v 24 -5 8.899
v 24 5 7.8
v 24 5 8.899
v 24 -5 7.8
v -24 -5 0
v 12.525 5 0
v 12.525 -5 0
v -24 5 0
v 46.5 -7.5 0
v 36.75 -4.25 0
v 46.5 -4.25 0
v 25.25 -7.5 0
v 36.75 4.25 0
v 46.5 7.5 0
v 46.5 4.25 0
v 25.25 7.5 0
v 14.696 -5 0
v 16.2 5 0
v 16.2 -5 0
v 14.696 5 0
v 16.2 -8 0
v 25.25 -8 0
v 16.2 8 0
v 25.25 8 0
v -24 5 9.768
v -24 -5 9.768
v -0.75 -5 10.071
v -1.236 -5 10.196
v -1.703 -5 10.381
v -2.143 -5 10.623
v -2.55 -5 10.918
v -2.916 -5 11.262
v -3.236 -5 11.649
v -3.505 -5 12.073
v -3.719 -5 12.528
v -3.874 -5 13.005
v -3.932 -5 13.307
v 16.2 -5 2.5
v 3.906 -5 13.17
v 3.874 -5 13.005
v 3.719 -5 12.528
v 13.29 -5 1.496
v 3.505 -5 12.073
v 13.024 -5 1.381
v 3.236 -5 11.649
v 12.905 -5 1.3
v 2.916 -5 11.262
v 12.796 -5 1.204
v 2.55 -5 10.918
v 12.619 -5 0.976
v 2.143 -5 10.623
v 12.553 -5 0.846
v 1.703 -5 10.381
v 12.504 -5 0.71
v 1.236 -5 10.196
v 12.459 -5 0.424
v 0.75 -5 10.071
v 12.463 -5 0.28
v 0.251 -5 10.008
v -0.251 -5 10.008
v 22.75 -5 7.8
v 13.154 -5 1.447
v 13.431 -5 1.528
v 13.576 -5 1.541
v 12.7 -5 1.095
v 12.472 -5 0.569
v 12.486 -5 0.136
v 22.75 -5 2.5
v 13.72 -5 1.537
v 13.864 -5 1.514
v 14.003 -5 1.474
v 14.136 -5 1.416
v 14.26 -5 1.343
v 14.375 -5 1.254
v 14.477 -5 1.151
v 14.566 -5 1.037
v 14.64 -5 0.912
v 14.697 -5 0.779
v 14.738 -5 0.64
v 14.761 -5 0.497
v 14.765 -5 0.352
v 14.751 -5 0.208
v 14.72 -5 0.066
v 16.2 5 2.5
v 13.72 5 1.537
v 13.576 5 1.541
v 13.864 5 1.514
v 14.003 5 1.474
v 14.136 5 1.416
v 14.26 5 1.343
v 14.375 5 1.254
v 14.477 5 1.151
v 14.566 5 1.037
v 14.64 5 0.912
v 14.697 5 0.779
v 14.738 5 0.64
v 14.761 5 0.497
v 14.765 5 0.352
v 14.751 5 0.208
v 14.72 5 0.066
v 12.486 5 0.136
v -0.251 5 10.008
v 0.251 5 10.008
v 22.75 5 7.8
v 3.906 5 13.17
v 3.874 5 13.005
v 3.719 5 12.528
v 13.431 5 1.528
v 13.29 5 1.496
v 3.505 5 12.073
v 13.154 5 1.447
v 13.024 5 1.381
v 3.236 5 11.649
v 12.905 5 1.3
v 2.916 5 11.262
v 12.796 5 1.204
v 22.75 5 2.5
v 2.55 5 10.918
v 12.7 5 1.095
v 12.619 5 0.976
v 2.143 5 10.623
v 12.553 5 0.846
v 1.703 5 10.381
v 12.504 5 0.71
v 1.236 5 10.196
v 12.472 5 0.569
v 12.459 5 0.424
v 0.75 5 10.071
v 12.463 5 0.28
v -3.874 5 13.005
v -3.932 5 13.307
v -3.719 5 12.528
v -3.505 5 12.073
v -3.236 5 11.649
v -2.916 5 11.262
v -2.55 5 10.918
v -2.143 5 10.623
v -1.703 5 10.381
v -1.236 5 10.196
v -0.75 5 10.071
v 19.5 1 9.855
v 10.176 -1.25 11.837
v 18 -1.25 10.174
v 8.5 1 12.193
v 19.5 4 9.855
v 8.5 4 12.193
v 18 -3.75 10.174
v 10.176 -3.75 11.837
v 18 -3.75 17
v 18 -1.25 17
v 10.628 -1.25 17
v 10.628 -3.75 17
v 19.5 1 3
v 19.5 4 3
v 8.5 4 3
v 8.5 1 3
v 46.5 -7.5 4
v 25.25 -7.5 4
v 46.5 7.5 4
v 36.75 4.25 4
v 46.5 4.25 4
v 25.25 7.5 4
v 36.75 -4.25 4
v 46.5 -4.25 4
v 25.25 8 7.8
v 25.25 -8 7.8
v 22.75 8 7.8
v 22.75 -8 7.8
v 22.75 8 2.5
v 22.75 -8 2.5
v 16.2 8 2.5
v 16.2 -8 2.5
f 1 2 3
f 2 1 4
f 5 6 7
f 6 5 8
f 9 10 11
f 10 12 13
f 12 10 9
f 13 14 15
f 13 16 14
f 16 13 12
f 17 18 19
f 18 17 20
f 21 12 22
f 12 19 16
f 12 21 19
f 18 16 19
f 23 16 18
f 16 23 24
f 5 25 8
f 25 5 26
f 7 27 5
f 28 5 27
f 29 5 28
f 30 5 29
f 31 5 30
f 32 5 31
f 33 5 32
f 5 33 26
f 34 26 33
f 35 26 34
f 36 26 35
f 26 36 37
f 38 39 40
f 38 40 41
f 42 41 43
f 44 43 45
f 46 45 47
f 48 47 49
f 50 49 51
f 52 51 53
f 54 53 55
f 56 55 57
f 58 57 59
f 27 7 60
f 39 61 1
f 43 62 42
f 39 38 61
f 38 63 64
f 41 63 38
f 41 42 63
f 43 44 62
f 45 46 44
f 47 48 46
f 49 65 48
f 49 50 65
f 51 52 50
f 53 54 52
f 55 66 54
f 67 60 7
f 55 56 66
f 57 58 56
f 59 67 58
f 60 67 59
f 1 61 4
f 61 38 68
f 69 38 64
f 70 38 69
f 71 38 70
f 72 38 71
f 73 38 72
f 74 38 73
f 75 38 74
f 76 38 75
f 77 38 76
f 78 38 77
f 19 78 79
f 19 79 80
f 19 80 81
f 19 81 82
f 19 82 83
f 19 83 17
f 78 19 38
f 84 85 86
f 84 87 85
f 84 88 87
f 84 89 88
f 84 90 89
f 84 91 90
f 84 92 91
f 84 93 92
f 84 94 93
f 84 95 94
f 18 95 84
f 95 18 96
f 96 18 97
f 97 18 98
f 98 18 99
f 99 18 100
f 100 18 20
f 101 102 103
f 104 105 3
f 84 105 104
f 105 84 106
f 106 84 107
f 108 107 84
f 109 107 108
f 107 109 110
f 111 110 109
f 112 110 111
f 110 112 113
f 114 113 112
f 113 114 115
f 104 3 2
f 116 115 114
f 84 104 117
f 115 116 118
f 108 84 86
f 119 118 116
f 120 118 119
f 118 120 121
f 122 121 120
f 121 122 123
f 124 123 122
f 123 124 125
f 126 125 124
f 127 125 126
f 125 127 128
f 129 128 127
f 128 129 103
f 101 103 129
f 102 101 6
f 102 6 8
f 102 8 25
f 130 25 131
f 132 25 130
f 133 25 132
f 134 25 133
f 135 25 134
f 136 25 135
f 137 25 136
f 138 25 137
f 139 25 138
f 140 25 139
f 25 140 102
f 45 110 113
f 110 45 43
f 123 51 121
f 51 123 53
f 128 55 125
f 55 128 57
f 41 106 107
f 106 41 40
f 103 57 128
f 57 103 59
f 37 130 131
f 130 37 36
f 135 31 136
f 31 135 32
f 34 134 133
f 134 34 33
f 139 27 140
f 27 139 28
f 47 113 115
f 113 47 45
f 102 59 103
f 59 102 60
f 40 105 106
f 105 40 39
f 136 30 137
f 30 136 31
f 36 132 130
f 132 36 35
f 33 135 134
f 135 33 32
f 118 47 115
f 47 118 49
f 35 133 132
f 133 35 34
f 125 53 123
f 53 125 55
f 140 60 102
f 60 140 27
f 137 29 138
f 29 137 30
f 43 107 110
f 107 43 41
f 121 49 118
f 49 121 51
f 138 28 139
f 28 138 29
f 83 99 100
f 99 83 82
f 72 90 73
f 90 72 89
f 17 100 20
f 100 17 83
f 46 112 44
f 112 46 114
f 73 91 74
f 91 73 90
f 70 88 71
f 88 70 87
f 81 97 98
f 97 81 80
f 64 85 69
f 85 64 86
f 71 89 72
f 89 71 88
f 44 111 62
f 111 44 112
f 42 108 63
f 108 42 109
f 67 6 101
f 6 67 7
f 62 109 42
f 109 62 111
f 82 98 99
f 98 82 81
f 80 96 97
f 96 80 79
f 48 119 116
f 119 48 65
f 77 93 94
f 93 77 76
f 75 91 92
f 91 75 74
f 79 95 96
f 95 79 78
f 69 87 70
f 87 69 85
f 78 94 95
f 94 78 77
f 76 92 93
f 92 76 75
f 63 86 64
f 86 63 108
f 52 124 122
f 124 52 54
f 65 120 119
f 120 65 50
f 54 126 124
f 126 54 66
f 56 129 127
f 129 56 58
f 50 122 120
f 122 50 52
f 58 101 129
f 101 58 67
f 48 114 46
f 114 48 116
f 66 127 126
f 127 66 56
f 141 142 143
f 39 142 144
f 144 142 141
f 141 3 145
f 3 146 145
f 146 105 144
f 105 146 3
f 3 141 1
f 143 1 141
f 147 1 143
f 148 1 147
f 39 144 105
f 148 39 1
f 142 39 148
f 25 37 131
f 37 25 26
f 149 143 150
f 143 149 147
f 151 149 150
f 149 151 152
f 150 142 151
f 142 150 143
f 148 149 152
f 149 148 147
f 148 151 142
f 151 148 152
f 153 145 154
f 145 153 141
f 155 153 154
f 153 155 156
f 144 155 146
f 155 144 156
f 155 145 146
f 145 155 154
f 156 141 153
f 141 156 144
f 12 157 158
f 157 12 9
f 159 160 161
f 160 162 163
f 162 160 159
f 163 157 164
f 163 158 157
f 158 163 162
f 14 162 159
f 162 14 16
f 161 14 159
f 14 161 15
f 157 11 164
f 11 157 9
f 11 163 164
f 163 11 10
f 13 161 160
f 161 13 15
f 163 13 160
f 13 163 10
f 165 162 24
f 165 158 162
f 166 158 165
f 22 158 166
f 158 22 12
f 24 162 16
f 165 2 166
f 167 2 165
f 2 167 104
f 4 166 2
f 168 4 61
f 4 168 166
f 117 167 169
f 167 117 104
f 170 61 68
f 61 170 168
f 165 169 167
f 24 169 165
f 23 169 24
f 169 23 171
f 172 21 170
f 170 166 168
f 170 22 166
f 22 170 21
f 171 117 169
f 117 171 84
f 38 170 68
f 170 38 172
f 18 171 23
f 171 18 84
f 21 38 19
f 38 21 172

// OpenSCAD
$fn=8;

ts=2.5; // толщина стенки
tp=1;//диаметр жилы
tpr=1.7;//диаметр провода
trb=[2,tp,3];//внешний, внутренний высота
knt=[20,11, 7.5, 7.8];//высота до центра, толщина, высота стопора
dkn=2.5;//длина контактной площадки
shp=3.0;//высота шипа
do=3.8;
guard=[15,8.5,11];
step=guard.x;//шаг контактов
lin=[step,knt.x+trb.x,4];//ширина, длина, толщина
kk=1;//количество контактов
hhr=4.5+0.5;//высота верхней части раъема
//прищепка
prk=[8,10,1.5,24,10];//диаметр опоры, ширина,диаметр проволоки, длина плеча,высота половины


alll();
//alll_0();
module alll(){
    difference(){
        union(){
            prih();
            translate([0, -step*(kk-1)/2, 0]) {
                for(a=[0:1:kk-1]){
                    translate([0,a*step,0]){
                        translate([lin.y+prk[3],0,0])rotate([0,0,-90])pin_lin();
                        translate([prk[3],0,knt[3]/2])cube([ts,step+1,knt[3]],true);
                        translate([prk[3]-knt[3]/2,0,ts/2])cube([knt[3],step+1,ts],true);
                    }
                }
            }
        }
        //for(a=[0:1:kk-1]){
           // translate([0,a*step,0]){
               // translate([prk[3]-ts,-step*(kk-1)/2,ts])cube([tp,tp,ts*13],true);
               // translate([prk[3]-ts-knt[3]/2,-step*(kk-1)/2,ts-tpr/2+0.1])cube([knt[3],tpr,tpr],true);
           // }
        //}
      //  translate([prk[3]-ts,0,knt[3]+ts*3/2])cube([ts,prk.y*2,ts*3],true);
      //  translate([-prk[3]*2+prk[3]-ts/2,0,0]){
            //translate([0,step+0.1,tpr/2+prk[4]/3])cube([prk[3]*4,tpr,tpr],true);
           // translate([0,step+0.1,tpr/2+2*prk[4]/3])cube([prk[3]*4,tpr,tpr],true);
           // translate([0,-step+0.1,tpr/2+prk[4]/3])cube([prk[3]*4,tpr,tpr],true);
          //  translate([0,-step+0.1,tpr/2+2*prk[4]/3])cube([prk[3]*4,tpr,tpr],true);
     //   }
        
    }
}
module alll_0(){
    difference(){
        union(){
            prih();
            translate([0, -step*(kk-1)/2, 0]) {
                for(a=[0:1:kk-1]){
                    translate([0,a*step,0]){
                        translate([lin.y+prk[3],0,0])rotate([0,0,-90])pin_lin_0();
                        translate([prk[3],0,knt[3]/2])cube([ts,step+1,knt[3]],true);
                        translate([prk[3]-knt[3]/2,0,ts/2])cube([knt[3],step+1,ts],true);
                    }
                }
            }
        }
        //for(a=[0:1:kk-1]){
           // translate([0,a*step,0]){
               // translate([prk[3]-ts,-step*(kk-1)/2,ts])cube([tp,tp,ts*13],true);
               // translate([prk[3]-ts-knt[3]/2,-step*(kk-1)/2,ts-tpr/2+0.1])cube([knt[3],tpr,tpr],true);
           // }
        //}
        //translate([prk[3]-ts,0,knt[3]+ts*3/2])cube([ts,prk.y*2,ts*3],true);
        //translate([-prk[3]*2+prk[3]-ts/2,0,0]){
          //  translate([0,step+0.1,tpr/2+prk[4]/3])cube([prk[3]*4,tpr,tpr],true);
          //  translate([0,step+0.1,tpr/2+2*prk[4]/3])cube([prk[3]*4,tpr,tpr],true);
          //  translate([0,-step+0.1,tpr/2+prk[4]/3])cube([prk[3]*4,tpr,tpr],true);
          //  translate([0,-step+0.1,tpr/2+2*prk[4]/3])cube([prk[3]*4,tpr,tpr],true);
       // }
        
    }
}

module prih(){
    $fn=50;
    difference(){
        union(){
            translate([0, 0, (prk[4]+prk[0]/2)])rotate([180,0,0])difference(){
                translate([0, 0, (prk[4]+prk[0]/2)/2]) cube([prk[3]*2,prk[1],prk[4]+prk[0]/2],true);
                translate([0, -prk[1]/2-0.5,0])rotate([-90,0,0])cylinder(prk[1]+1,prk[0]/2,prk[0]/2);
                rotate([0,-45,0])translate([prk[3]-prk[0]/2-prk[2]/2, -prk[1]/2-0.5,0])rotate([-90,0,0])cylinder(prk[1]+1,prk[2]/1.3,prk[2]/1.3);
                rotate([0,-12,0])translate([0, 0, -(prk[4]+prk[0]/2)/2]) cube([prk[3]*4,prk[1]*2,prk[4]+prk[0]/2],true);
                rotate([0,10,0])translate([0, 0, -(prk[4]+prk[0]/2)/2]) cube([prk[3]*4,prk[1]*2,prk[4]+prk[0]/2],true);
            }
            difference(){
                translate([prk[3]-prk[1], -2*ts/2, prk[4]]) cube([prk[1]-2,ts,prk[4]*1.4],true);
                translate([prk[3]-prk[1]-(prk[1]-2), -2*ts/2, prk[4]]) rotate([0,5,0])cube([prk[1]-2,ts*2,prk[4]*2],true);
            }
        }
        translate([(prk[3]-prk[1]), 2*ts/2, prk[4]]) cube([prk[1]+1,ts+0.5,prk[4]*1.4],true);
    }
    
}

//all_2();
module all_2(){
    difference(){
        union(){
            for(a=[0:1:kk-1]){
                translate([0,0,a*step])pin2();
            }
            for(a=[0:1:kk-1]){
                translate([knt[3]/2,0,a*step+step/2])ship();
            }
            hh=step*kk;
            translate([knt.y+ts/2, 0, hh/2]) cube([ts,knt.x*2,hh],true);
            translate([knt.y/2, -ts/2, hh/2]) cube([knt.y+ts+lin.z,ts,hh],true);
        }
        for(a=[0:1:kk-1]){
            translate([0,0,a*step])pin3();
        }
        for(a=[0:1:kk-1]){
            translate([0,0,a*step])pin4();
        }
    }
}

module ship(){
    intersection(){
        rotate([-90,0,0])cylinder(shp,do/2,do/2);
        cube([ts,do*4,8],true);
    }
}


module pin4(){
    translate([knt.x/2,-ts-0.1,step/2])cube([knt.x*2,tp,tp],true);;
}

module pin3(){
    translate([knt.y+ts,-knt.x/2-ts,step/2])cube([tpr,knt.x,tpr],true);;
}


module pin2(){
    //translate([-lin.z,knt.x,step/2])rotate([0,90,0])pin();
    translate([-lin.z,knt.x,step/2])rotate([0,90,0])pin_lin();
}

module pin1(){
    translate([0,0,lin.z])rotate([0,180,0])pin();
}

module pin(){
    difference(){
        union(){
            cylinder(trb.z+lin.z,trb.x/2,trb.x/2);
            translate([0, trb.x/2-lin.y/2,lin.z/2]) cube(lin,true);
        }
        translate([0,0,-0.1])cylinder(trb.z*2,trb.y/2,trb.y/2);
        translate([0,-(trb.x/2+trb.y),-0.1])cylinder(trb.z*2,trb.y/2,trb.y/2);
        translate([0, 0,trb.z+lin.z+trb.x/4]) rotate([-45,0,0])cube([trb.x*2,trb.x*2,trb.x/2],true);
    }
}

//pin_lin();
module pin_lin(){
    difference(){
        union(){
            //cylinder(trb.z+lin.z,trb.x/2,trb.x/2);
          //  translate([0, -trb.z/2+trb.y,(trb.z+lin.z)/2]) cube([lin.x,dkn,trb.z+lin.z],true);
           // translate([0, -trb.z/2+trb.y-dkn/2-ts/2-hhr,(trb.z+lin.z+ts)/2]) cube([lin.x,ts,trb.z+lin.z+ts],true);
            translate([0, trb.x/2-lin.y/2-0.5,lin.z/2]) cube(lin,true);
        }
        //translate([0,-0.25,-0.1])cylinder(trb.z*2,trb.y/2,trb.y/2);
       // translate([0,-0.25,trb.z-0.1])cube([trb.y,trb.y,trb.z*2],true);
       // translate([0,-trb.z+0.25,trb.z-0.1])cube([trb.y,trb.y,trb.z*2],true);
      //  translate([0, 0,trb.z+lin.z+trb.x/4]) rotate([-45,0,0])cube([trb.x*2,trb.x*3,trb.x/2],true);
        translate([0, -trb.z/2+trb.y-dkn/2-hhr-ts+guard.z,ts]) cube([guard.y,guard.z*2,ts*5],true);
    }
}
module pin_lin_0(){
    difference(){
        union(){
            //cylinder(trb.z+lin.z,trb.x/2,trb.x/2);
            //translate([0, -trb.z/2+trb.y,(trb.z+lin.z)/2]) cube([lin.x,dkn,trb.z+lin.z],true);
           // translate([0, -trb.z/2+trb.y-dkn/2-ts/2-hhr,(trb.z+lin.z+ts)/2]) cube([lin.x,ts,trb.z+lin.z+ts],true);
            translate([0, trb.x/2-lin.y/2-0.5,lin.z]) cube([lin.x, lin.y, lin.z*2],true);
        }
        //translate([0,-0.25,-0.1])cylinder(trb.z*2,trb.y/2,trb.y/2);
        //translate([0,-0.25,trb.z-0.1])cube([trb.y,trb.y,trb.z*2],true);
        //translate([0,-trb.z+0.25,trb.z-0.1])cube([trb.y,trb.y,trb.z*2],true);
       // translate([0, 0,trb.z+lin.z+trb.x/4]) rotate([-45,0,0])cube([trb.x*2,trb.x*3,trb.x/2],true);
    }
}
module pin_s(){
    difference(){
        union(){
            cylinder(trb.z+lin.z-trb.x/2,trb.x/2,trb.x/2);
            translate([0, 0,trb.z+lin.z-trb.x/2])sphere(r=trb.x/2);
            translate([0, trb.x/2-lin.y/2,lin.z/2]) cube(lin,true);
        }
        translate([0,0,-0.1])cylinder(trb.z*2,trb.y/2,trb.y/2);
        translate([0,-(trb.x/2+trb.y),-0.1])cylinder(trb.z*2,trb.y/2,trb.y/2);
    }
}
